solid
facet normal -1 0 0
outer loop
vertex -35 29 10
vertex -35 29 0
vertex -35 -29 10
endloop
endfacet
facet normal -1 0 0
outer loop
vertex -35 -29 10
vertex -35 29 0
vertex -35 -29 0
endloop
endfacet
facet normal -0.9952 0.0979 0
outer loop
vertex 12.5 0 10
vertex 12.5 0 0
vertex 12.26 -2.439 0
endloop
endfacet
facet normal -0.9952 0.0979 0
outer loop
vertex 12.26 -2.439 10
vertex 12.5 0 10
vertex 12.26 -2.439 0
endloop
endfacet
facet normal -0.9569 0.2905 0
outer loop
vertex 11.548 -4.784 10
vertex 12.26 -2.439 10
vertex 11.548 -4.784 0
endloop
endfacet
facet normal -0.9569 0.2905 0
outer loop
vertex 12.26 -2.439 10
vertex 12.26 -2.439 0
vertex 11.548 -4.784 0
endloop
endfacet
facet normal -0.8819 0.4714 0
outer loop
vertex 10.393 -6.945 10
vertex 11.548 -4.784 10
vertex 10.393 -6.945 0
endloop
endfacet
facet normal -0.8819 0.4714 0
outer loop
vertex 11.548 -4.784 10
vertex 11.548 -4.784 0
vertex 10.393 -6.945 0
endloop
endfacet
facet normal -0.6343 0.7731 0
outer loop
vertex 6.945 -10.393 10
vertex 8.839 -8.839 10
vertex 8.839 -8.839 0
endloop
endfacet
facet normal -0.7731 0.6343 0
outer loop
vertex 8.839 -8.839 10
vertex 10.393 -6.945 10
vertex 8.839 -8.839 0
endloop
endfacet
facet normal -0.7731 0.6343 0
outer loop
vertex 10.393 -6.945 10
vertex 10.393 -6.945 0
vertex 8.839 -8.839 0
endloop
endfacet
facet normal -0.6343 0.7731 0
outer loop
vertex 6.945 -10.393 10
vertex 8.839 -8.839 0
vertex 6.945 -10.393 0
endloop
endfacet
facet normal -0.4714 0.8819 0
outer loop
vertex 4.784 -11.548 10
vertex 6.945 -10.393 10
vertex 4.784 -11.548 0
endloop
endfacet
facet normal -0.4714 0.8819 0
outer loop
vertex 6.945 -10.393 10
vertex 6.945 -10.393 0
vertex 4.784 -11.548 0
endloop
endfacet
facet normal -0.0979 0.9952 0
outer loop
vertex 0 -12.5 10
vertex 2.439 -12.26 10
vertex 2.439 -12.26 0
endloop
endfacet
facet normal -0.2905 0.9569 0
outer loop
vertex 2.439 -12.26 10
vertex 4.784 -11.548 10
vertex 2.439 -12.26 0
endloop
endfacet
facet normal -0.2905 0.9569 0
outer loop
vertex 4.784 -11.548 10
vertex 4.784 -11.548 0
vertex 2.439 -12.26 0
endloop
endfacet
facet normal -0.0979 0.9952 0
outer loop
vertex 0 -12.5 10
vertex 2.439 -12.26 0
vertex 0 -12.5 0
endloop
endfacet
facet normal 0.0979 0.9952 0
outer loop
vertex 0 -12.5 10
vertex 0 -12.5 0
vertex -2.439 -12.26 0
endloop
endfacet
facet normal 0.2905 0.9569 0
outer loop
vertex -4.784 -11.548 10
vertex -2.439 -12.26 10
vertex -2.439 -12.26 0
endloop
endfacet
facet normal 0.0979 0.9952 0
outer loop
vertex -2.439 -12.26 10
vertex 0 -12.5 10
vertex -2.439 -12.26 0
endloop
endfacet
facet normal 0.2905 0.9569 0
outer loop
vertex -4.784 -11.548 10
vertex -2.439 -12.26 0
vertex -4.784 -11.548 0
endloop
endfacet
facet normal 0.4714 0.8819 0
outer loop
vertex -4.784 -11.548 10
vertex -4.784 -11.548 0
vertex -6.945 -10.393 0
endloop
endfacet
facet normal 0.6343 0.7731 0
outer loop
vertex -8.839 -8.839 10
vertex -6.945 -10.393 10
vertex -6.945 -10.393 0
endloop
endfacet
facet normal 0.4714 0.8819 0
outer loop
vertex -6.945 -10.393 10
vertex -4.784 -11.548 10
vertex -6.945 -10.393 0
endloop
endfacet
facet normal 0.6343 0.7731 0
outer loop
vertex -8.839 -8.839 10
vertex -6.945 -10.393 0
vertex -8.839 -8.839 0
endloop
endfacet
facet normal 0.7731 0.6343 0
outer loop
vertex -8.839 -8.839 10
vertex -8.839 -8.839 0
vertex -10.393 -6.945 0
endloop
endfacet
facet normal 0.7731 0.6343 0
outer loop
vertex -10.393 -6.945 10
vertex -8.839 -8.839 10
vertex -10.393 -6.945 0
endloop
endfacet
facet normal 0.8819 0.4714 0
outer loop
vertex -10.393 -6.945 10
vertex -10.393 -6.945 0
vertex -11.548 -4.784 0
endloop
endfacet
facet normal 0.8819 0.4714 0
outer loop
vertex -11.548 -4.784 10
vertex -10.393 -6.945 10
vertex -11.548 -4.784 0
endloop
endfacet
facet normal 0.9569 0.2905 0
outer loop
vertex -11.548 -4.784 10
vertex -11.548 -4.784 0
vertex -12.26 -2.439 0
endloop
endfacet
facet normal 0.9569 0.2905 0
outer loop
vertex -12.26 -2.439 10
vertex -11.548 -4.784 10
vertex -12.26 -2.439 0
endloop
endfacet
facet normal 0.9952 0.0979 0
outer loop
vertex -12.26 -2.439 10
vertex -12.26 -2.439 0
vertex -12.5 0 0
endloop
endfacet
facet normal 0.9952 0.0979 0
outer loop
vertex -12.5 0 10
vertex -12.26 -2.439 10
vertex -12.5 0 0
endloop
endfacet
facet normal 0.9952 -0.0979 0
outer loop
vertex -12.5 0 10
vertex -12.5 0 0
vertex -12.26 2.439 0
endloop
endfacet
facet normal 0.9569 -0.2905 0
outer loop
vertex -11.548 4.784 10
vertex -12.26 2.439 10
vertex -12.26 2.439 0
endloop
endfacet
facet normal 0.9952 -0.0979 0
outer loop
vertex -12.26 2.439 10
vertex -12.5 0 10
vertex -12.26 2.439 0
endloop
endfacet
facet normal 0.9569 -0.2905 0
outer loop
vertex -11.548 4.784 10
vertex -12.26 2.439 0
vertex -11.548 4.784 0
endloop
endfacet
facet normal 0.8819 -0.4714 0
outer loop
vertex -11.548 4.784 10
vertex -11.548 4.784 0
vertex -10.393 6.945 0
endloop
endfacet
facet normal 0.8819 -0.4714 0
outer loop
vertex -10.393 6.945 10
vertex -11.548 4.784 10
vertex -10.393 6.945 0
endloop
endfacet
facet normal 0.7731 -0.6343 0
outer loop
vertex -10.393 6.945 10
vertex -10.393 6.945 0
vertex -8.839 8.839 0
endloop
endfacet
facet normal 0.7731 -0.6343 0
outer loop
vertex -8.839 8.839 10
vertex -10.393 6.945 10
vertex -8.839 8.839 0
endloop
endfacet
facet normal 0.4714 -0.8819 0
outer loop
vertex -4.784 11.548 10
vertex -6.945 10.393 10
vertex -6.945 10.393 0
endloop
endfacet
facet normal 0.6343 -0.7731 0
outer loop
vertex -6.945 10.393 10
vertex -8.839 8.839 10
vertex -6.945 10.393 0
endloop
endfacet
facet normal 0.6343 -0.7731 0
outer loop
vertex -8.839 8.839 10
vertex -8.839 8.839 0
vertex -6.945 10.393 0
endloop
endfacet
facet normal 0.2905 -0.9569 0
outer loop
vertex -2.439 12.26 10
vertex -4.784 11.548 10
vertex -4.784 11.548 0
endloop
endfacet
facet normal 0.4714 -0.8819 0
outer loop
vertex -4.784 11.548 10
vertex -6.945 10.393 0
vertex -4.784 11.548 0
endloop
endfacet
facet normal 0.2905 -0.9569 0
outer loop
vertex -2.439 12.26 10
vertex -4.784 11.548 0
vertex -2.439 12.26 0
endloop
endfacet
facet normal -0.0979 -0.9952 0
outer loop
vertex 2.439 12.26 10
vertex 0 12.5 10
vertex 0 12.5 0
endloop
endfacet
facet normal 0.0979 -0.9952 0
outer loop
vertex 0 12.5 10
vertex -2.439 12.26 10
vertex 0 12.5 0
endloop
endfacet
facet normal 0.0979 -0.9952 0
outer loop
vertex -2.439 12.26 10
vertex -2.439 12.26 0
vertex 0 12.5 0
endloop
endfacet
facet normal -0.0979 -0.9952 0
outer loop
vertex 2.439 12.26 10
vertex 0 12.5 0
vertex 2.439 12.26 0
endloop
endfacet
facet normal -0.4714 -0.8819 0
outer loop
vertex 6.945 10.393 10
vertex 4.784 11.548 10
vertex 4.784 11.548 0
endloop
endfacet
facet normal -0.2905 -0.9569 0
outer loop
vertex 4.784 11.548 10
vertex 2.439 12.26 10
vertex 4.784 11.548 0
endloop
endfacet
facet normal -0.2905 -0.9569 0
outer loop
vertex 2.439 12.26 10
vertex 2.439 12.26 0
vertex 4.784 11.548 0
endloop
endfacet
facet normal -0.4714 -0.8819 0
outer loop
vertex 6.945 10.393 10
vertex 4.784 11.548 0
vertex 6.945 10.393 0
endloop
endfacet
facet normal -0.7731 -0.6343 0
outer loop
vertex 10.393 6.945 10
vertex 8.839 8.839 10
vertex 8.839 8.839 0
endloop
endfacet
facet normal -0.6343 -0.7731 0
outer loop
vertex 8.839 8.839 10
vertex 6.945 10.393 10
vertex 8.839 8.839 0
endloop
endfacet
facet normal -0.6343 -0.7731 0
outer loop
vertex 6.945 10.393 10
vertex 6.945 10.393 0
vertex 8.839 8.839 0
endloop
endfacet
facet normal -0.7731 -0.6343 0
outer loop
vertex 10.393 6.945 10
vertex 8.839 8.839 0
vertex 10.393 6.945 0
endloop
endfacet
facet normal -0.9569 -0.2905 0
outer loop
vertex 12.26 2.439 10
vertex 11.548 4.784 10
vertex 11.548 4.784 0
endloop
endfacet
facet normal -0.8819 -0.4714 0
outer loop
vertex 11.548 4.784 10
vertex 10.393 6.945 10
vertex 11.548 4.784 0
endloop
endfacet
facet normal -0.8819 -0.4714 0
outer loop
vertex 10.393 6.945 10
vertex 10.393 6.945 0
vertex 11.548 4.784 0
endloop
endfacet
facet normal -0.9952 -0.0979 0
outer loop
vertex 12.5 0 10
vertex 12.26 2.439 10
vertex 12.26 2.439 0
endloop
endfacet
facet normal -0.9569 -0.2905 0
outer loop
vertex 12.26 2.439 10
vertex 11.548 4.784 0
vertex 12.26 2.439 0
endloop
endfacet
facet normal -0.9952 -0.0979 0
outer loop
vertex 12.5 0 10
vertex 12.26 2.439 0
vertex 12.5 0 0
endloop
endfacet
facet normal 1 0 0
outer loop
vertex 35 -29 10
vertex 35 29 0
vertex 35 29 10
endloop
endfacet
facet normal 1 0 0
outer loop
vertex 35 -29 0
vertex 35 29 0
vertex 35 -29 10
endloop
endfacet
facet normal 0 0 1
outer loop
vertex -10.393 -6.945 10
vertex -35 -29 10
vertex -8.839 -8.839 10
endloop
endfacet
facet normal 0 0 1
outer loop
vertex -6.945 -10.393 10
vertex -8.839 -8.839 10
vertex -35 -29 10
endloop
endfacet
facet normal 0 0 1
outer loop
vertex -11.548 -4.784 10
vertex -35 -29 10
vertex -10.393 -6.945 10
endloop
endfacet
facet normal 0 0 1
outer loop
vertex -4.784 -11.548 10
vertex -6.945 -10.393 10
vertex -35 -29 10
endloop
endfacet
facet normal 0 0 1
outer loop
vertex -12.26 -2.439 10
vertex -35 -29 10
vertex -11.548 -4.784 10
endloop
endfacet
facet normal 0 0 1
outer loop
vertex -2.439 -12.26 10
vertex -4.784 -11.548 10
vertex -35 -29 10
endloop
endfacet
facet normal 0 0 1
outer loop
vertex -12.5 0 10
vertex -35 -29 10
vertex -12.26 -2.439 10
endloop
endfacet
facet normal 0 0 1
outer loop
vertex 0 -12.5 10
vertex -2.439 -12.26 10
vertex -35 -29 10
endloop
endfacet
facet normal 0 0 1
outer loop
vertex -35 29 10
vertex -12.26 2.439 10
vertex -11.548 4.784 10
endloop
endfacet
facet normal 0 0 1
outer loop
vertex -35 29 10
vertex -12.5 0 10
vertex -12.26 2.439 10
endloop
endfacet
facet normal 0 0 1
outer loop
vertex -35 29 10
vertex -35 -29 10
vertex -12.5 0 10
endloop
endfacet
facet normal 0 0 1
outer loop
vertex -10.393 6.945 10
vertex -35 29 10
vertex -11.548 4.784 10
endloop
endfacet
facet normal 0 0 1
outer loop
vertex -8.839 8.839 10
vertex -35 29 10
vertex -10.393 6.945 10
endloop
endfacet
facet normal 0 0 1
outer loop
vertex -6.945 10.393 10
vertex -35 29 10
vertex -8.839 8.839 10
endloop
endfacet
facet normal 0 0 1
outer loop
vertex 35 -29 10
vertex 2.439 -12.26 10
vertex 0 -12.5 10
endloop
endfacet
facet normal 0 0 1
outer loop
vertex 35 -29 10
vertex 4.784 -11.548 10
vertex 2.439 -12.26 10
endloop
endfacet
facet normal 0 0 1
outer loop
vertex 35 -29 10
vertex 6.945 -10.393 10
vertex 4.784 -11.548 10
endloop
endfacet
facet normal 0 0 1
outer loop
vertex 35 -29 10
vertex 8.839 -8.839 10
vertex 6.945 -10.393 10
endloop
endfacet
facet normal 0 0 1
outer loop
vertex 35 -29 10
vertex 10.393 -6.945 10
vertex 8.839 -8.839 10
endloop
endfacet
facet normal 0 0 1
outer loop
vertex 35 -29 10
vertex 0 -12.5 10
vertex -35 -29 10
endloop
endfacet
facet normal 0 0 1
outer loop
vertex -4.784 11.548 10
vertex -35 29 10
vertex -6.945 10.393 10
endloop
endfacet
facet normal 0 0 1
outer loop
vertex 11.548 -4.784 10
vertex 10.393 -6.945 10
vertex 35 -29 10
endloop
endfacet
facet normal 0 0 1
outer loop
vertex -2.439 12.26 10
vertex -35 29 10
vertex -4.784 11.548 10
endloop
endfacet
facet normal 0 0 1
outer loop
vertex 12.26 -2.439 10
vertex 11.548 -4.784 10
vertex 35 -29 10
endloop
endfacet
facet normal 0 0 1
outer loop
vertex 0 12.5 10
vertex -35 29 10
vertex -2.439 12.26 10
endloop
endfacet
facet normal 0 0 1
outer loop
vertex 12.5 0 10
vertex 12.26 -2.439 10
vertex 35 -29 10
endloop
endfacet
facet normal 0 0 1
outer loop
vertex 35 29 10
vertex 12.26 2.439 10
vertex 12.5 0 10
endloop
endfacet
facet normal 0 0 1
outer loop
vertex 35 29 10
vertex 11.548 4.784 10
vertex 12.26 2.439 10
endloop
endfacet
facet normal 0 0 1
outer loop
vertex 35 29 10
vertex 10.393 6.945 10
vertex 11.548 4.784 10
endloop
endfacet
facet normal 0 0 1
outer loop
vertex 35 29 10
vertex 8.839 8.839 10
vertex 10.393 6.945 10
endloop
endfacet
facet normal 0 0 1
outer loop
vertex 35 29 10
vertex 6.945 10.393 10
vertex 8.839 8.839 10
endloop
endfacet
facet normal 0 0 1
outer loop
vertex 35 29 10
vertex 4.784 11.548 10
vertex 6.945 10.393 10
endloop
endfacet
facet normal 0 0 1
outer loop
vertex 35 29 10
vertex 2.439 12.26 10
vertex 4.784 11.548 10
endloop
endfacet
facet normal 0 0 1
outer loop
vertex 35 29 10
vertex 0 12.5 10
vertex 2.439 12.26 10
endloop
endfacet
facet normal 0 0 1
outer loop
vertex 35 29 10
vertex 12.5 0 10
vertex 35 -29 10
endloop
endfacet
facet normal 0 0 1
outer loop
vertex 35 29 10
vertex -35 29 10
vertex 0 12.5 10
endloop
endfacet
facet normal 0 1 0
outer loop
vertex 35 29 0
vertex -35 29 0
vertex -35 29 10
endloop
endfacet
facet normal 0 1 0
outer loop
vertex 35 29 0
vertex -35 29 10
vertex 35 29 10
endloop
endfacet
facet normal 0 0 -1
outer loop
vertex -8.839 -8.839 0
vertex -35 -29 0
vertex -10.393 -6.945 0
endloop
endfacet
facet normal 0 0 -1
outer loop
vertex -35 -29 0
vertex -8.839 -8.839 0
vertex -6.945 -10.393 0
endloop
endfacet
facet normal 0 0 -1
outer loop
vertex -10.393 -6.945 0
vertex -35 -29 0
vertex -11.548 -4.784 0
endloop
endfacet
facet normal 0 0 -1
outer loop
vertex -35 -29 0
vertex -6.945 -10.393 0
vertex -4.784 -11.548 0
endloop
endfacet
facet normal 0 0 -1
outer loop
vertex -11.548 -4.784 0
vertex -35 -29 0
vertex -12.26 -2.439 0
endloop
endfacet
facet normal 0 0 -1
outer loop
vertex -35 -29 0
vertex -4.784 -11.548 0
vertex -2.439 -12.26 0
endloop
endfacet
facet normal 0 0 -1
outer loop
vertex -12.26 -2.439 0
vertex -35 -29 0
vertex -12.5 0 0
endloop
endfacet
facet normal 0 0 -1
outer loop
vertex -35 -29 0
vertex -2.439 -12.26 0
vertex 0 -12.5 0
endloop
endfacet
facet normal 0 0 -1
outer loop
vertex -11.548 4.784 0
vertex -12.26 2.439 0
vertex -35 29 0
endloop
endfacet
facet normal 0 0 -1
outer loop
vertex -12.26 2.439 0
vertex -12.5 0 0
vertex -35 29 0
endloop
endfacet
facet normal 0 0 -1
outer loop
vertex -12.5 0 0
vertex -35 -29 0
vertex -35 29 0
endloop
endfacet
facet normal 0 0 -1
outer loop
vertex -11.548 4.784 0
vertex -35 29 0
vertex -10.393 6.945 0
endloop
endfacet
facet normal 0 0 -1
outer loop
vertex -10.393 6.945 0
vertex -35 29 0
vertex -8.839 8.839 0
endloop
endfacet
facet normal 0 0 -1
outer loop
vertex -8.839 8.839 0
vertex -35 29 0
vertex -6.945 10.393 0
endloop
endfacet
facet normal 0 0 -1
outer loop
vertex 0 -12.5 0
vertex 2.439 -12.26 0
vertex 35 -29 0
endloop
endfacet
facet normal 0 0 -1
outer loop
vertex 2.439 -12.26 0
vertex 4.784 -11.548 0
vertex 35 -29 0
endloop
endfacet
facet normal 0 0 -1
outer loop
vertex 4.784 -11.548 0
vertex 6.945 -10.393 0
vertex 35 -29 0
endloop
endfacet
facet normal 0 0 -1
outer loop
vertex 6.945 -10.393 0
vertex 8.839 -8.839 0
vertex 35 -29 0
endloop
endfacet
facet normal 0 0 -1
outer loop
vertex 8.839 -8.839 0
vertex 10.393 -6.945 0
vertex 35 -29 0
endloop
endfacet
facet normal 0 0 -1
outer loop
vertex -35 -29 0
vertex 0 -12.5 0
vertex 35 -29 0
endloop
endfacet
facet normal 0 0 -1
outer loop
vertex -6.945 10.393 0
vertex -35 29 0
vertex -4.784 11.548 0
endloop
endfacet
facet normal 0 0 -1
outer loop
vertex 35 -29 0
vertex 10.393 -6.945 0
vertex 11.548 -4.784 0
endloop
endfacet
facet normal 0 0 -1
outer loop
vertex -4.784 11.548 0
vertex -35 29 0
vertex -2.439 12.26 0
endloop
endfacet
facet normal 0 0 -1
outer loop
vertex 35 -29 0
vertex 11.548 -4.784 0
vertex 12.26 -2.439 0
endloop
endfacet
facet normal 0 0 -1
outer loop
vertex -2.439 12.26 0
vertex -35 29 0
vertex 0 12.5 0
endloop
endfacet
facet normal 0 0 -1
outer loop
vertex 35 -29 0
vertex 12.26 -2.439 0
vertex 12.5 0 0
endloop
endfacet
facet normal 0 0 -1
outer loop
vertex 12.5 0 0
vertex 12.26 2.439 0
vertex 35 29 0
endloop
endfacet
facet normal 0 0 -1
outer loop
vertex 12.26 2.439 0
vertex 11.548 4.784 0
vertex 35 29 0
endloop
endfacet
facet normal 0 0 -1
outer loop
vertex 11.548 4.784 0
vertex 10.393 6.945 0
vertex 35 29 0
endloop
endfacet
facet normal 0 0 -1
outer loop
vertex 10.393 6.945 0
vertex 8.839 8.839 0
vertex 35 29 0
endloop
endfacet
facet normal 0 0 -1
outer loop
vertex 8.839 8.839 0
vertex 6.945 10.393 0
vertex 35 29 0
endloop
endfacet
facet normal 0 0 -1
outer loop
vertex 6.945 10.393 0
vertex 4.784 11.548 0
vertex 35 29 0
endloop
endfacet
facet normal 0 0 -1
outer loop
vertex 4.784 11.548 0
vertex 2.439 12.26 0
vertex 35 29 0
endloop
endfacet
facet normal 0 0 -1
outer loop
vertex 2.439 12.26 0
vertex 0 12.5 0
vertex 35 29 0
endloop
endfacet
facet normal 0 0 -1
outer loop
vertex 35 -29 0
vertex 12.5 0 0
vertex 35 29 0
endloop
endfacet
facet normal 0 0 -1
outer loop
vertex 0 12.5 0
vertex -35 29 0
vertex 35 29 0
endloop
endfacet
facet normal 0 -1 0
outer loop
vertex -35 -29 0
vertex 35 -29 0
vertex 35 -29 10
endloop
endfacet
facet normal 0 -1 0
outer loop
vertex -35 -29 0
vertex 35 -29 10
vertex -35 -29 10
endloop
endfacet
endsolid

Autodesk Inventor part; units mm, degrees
ref_plane "YZ Plane" through (0, 0, 0) normal (1, 0, 0) x (0, 1, 0)
ref_plane "XZ Plane" through (0, 0, 0) normal (0, 1, 0) x (-1, 0, 0)
ref_plane "XY Plane" through (0, 0, 0) normal (0, 0, 1) x (1, 0, 0)
sketch "Szkic1" plane through (0, 0, 0) normal (0, 0, 1) x (1, 0, 0)
  circle A0 centre (0, 0) radius 12.5
  line L0 (-35, 29) -> (35, 29)
  line L1 (35, -29) -> (-35, -29)
  line L2 (-35, 29) -> (-35, -29)
  line L3 (35, 29) -> (35, -29)
  dimension "d0" = 25
extrude "Wyciągnięcie proste1" add sketch "Szkic1" along normal blind 10
properties part number "rama_1"
